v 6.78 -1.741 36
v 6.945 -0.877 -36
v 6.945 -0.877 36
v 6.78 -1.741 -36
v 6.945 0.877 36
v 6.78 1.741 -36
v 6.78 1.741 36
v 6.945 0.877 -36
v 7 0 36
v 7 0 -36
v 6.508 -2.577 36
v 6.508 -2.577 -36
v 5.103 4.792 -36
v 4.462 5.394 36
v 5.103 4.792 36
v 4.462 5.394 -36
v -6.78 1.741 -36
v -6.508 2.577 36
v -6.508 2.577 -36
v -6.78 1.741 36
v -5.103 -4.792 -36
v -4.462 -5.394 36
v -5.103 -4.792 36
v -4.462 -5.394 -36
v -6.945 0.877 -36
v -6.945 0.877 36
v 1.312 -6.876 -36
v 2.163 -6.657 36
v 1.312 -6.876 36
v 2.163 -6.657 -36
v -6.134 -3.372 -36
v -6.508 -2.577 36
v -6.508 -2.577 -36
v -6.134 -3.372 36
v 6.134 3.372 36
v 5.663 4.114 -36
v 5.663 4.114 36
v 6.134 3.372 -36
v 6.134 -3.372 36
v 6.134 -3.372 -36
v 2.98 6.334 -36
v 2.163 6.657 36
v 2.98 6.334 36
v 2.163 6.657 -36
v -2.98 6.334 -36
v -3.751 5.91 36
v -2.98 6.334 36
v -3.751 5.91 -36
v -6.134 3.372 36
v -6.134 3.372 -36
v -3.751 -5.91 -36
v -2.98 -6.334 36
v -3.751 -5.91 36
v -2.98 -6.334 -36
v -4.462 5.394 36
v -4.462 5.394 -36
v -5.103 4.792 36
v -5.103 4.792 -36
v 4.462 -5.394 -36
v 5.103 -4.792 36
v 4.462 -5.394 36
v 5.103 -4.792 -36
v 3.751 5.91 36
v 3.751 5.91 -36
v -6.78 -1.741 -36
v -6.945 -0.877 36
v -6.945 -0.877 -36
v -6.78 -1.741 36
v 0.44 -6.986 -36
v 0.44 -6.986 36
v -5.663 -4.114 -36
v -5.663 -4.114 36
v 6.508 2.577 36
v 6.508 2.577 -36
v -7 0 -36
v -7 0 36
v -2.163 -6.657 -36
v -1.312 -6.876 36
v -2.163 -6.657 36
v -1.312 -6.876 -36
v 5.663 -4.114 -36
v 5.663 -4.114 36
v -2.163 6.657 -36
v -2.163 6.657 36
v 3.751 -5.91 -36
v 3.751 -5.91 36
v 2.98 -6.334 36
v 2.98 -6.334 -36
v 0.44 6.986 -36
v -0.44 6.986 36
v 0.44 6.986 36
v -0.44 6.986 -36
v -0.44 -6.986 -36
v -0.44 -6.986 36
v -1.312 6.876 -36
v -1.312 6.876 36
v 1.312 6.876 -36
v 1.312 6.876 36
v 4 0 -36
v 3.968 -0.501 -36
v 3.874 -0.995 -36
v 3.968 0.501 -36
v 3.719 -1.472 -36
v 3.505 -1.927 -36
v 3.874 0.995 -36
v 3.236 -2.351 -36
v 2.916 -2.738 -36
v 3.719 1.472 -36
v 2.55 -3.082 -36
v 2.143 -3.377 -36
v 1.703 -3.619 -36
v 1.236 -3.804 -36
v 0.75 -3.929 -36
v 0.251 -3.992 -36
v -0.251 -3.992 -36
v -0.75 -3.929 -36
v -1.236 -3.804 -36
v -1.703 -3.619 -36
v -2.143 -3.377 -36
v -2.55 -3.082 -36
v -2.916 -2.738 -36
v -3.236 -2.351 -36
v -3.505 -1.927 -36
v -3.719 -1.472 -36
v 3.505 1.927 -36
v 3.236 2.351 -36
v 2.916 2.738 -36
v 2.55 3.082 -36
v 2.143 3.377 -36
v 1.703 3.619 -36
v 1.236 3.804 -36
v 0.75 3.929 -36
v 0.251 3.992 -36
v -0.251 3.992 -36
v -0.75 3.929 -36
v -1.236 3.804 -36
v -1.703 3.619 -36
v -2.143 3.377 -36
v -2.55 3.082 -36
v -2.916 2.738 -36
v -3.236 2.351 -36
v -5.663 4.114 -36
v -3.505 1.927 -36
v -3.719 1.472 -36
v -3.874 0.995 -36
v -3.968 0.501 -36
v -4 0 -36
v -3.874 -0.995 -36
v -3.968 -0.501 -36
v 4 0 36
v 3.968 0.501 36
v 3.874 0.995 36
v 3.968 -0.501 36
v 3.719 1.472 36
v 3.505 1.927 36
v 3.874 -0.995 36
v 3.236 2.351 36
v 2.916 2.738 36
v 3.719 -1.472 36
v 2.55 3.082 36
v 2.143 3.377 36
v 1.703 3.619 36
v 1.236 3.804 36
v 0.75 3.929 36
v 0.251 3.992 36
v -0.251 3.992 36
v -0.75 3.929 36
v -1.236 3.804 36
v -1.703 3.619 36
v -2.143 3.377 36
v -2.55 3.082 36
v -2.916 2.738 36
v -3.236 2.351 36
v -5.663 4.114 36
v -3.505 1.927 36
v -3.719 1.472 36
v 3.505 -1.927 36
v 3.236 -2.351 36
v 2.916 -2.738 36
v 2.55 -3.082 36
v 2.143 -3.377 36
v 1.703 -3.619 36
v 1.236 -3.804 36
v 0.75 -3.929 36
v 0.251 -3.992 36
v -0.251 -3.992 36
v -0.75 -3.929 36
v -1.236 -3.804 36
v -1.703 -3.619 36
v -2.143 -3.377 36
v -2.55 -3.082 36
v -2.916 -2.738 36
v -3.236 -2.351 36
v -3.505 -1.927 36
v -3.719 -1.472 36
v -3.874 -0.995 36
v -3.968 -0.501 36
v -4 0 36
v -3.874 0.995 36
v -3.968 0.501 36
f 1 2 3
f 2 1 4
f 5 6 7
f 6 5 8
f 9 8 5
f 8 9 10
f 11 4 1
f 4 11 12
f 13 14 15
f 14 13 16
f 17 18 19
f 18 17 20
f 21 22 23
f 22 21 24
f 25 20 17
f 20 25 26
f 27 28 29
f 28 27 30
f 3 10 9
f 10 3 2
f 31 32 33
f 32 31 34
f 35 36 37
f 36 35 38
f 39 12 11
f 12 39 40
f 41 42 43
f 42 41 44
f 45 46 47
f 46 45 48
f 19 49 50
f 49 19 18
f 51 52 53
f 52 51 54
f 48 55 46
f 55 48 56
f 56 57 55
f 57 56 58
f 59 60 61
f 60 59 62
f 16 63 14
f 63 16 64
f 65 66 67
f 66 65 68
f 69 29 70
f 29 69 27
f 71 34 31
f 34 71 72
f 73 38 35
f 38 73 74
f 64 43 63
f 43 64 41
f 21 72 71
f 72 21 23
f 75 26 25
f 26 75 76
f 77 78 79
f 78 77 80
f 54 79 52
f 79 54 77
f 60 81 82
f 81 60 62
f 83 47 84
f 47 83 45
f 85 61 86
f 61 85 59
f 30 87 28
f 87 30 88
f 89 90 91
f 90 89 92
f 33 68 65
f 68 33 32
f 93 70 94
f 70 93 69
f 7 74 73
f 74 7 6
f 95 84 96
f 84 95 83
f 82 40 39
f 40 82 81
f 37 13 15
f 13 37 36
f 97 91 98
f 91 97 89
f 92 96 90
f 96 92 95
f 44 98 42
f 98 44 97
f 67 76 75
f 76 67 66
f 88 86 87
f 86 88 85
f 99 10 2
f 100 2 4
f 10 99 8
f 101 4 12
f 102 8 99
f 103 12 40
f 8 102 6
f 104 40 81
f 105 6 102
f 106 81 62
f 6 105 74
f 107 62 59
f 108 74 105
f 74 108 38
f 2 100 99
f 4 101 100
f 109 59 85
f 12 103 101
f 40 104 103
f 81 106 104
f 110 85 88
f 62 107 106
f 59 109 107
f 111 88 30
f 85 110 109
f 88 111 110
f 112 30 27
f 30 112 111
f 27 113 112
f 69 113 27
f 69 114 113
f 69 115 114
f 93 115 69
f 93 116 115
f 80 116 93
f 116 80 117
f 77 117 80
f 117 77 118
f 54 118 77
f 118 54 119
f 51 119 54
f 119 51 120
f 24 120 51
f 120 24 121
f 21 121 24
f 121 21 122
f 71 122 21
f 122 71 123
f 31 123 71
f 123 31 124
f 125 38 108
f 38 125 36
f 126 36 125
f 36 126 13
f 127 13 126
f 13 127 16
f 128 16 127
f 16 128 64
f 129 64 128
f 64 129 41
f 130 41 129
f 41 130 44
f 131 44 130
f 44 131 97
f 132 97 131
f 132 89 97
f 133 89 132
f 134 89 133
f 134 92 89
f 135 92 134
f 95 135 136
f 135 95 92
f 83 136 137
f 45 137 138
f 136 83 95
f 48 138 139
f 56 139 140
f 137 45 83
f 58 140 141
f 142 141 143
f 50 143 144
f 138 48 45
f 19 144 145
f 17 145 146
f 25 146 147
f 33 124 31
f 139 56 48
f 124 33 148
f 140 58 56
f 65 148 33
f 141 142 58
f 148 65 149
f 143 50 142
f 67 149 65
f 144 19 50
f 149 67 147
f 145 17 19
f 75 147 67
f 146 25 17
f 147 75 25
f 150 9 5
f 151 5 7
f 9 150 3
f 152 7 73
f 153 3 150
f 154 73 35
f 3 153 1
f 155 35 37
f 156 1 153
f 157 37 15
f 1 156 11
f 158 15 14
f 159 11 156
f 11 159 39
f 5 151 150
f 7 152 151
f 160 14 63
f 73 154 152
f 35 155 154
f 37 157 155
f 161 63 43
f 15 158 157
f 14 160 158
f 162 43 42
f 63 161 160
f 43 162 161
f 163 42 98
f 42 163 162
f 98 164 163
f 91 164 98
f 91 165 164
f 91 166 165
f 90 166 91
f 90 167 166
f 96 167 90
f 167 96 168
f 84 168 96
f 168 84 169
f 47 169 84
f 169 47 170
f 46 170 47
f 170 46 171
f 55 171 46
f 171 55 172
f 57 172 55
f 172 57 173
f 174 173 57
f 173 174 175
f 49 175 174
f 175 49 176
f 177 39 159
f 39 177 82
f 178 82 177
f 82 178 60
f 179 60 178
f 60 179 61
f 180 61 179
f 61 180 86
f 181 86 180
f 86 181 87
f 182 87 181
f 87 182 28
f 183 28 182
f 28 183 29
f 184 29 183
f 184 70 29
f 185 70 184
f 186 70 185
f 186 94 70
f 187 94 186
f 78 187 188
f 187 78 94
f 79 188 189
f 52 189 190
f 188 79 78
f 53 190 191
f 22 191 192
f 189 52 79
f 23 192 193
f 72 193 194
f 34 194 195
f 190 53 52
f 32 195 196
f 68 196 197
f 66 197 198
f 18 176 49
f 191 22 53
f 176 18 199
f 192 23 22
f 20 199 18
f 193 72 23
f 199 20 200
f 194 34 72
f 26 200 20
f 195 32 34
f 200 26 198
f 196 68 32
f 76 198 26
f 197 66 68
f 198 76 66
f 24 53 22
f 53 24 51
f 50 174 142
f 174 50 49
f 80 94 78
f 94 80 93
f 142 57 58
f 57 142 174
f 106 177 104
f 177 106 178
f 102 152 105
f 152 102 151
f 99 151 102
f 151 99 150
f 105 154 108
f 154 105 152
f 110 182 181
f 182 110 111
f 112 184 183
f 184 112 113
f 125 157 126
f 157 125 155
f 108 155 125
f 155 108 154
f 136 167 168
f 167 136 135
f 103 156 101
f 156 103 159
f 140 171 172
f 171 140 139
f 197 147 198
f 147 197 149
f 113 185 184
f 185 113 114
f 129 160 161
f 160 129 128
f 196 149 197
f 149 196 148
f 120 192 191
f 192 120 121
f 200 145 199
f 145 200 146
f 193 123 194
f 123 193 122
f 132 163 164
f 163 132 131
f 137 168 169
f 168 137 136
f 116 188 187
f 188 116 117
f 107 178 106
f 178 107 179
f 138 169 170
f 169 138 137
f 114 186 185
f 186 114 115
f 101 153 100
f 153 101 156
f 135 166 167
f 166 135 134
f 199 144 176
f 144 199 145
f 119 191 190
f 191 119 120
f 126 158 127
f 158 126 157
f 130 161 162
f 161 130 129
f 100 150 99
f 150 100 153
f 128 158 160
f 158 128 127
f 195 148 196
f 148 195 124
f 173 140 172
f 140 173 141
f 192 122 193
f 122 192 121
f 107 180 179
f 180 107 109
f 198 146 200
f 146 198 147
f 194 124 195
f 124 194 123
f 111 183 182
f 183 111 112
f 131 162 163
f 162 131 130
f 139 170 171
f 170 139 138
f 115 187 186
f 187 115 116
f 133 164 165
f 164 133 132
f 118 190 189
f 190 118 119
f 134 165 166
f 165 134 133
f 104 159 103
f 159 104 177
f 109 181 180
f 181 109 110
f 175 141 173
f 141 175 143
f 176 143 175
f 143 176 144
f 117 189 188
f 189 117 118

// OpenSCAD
$fn = 50;


difference() {
	union() {
		translate(v = [0, 0, -36.0000000000]) {
			cylinder(h = 72, r = 7.0000000000);
		}
	}
	union() {
		translate(v = [0, 0, -100.0000000000]) {
			cylinder(h = 200, r = 4.0000000000);
		}
	}
}
